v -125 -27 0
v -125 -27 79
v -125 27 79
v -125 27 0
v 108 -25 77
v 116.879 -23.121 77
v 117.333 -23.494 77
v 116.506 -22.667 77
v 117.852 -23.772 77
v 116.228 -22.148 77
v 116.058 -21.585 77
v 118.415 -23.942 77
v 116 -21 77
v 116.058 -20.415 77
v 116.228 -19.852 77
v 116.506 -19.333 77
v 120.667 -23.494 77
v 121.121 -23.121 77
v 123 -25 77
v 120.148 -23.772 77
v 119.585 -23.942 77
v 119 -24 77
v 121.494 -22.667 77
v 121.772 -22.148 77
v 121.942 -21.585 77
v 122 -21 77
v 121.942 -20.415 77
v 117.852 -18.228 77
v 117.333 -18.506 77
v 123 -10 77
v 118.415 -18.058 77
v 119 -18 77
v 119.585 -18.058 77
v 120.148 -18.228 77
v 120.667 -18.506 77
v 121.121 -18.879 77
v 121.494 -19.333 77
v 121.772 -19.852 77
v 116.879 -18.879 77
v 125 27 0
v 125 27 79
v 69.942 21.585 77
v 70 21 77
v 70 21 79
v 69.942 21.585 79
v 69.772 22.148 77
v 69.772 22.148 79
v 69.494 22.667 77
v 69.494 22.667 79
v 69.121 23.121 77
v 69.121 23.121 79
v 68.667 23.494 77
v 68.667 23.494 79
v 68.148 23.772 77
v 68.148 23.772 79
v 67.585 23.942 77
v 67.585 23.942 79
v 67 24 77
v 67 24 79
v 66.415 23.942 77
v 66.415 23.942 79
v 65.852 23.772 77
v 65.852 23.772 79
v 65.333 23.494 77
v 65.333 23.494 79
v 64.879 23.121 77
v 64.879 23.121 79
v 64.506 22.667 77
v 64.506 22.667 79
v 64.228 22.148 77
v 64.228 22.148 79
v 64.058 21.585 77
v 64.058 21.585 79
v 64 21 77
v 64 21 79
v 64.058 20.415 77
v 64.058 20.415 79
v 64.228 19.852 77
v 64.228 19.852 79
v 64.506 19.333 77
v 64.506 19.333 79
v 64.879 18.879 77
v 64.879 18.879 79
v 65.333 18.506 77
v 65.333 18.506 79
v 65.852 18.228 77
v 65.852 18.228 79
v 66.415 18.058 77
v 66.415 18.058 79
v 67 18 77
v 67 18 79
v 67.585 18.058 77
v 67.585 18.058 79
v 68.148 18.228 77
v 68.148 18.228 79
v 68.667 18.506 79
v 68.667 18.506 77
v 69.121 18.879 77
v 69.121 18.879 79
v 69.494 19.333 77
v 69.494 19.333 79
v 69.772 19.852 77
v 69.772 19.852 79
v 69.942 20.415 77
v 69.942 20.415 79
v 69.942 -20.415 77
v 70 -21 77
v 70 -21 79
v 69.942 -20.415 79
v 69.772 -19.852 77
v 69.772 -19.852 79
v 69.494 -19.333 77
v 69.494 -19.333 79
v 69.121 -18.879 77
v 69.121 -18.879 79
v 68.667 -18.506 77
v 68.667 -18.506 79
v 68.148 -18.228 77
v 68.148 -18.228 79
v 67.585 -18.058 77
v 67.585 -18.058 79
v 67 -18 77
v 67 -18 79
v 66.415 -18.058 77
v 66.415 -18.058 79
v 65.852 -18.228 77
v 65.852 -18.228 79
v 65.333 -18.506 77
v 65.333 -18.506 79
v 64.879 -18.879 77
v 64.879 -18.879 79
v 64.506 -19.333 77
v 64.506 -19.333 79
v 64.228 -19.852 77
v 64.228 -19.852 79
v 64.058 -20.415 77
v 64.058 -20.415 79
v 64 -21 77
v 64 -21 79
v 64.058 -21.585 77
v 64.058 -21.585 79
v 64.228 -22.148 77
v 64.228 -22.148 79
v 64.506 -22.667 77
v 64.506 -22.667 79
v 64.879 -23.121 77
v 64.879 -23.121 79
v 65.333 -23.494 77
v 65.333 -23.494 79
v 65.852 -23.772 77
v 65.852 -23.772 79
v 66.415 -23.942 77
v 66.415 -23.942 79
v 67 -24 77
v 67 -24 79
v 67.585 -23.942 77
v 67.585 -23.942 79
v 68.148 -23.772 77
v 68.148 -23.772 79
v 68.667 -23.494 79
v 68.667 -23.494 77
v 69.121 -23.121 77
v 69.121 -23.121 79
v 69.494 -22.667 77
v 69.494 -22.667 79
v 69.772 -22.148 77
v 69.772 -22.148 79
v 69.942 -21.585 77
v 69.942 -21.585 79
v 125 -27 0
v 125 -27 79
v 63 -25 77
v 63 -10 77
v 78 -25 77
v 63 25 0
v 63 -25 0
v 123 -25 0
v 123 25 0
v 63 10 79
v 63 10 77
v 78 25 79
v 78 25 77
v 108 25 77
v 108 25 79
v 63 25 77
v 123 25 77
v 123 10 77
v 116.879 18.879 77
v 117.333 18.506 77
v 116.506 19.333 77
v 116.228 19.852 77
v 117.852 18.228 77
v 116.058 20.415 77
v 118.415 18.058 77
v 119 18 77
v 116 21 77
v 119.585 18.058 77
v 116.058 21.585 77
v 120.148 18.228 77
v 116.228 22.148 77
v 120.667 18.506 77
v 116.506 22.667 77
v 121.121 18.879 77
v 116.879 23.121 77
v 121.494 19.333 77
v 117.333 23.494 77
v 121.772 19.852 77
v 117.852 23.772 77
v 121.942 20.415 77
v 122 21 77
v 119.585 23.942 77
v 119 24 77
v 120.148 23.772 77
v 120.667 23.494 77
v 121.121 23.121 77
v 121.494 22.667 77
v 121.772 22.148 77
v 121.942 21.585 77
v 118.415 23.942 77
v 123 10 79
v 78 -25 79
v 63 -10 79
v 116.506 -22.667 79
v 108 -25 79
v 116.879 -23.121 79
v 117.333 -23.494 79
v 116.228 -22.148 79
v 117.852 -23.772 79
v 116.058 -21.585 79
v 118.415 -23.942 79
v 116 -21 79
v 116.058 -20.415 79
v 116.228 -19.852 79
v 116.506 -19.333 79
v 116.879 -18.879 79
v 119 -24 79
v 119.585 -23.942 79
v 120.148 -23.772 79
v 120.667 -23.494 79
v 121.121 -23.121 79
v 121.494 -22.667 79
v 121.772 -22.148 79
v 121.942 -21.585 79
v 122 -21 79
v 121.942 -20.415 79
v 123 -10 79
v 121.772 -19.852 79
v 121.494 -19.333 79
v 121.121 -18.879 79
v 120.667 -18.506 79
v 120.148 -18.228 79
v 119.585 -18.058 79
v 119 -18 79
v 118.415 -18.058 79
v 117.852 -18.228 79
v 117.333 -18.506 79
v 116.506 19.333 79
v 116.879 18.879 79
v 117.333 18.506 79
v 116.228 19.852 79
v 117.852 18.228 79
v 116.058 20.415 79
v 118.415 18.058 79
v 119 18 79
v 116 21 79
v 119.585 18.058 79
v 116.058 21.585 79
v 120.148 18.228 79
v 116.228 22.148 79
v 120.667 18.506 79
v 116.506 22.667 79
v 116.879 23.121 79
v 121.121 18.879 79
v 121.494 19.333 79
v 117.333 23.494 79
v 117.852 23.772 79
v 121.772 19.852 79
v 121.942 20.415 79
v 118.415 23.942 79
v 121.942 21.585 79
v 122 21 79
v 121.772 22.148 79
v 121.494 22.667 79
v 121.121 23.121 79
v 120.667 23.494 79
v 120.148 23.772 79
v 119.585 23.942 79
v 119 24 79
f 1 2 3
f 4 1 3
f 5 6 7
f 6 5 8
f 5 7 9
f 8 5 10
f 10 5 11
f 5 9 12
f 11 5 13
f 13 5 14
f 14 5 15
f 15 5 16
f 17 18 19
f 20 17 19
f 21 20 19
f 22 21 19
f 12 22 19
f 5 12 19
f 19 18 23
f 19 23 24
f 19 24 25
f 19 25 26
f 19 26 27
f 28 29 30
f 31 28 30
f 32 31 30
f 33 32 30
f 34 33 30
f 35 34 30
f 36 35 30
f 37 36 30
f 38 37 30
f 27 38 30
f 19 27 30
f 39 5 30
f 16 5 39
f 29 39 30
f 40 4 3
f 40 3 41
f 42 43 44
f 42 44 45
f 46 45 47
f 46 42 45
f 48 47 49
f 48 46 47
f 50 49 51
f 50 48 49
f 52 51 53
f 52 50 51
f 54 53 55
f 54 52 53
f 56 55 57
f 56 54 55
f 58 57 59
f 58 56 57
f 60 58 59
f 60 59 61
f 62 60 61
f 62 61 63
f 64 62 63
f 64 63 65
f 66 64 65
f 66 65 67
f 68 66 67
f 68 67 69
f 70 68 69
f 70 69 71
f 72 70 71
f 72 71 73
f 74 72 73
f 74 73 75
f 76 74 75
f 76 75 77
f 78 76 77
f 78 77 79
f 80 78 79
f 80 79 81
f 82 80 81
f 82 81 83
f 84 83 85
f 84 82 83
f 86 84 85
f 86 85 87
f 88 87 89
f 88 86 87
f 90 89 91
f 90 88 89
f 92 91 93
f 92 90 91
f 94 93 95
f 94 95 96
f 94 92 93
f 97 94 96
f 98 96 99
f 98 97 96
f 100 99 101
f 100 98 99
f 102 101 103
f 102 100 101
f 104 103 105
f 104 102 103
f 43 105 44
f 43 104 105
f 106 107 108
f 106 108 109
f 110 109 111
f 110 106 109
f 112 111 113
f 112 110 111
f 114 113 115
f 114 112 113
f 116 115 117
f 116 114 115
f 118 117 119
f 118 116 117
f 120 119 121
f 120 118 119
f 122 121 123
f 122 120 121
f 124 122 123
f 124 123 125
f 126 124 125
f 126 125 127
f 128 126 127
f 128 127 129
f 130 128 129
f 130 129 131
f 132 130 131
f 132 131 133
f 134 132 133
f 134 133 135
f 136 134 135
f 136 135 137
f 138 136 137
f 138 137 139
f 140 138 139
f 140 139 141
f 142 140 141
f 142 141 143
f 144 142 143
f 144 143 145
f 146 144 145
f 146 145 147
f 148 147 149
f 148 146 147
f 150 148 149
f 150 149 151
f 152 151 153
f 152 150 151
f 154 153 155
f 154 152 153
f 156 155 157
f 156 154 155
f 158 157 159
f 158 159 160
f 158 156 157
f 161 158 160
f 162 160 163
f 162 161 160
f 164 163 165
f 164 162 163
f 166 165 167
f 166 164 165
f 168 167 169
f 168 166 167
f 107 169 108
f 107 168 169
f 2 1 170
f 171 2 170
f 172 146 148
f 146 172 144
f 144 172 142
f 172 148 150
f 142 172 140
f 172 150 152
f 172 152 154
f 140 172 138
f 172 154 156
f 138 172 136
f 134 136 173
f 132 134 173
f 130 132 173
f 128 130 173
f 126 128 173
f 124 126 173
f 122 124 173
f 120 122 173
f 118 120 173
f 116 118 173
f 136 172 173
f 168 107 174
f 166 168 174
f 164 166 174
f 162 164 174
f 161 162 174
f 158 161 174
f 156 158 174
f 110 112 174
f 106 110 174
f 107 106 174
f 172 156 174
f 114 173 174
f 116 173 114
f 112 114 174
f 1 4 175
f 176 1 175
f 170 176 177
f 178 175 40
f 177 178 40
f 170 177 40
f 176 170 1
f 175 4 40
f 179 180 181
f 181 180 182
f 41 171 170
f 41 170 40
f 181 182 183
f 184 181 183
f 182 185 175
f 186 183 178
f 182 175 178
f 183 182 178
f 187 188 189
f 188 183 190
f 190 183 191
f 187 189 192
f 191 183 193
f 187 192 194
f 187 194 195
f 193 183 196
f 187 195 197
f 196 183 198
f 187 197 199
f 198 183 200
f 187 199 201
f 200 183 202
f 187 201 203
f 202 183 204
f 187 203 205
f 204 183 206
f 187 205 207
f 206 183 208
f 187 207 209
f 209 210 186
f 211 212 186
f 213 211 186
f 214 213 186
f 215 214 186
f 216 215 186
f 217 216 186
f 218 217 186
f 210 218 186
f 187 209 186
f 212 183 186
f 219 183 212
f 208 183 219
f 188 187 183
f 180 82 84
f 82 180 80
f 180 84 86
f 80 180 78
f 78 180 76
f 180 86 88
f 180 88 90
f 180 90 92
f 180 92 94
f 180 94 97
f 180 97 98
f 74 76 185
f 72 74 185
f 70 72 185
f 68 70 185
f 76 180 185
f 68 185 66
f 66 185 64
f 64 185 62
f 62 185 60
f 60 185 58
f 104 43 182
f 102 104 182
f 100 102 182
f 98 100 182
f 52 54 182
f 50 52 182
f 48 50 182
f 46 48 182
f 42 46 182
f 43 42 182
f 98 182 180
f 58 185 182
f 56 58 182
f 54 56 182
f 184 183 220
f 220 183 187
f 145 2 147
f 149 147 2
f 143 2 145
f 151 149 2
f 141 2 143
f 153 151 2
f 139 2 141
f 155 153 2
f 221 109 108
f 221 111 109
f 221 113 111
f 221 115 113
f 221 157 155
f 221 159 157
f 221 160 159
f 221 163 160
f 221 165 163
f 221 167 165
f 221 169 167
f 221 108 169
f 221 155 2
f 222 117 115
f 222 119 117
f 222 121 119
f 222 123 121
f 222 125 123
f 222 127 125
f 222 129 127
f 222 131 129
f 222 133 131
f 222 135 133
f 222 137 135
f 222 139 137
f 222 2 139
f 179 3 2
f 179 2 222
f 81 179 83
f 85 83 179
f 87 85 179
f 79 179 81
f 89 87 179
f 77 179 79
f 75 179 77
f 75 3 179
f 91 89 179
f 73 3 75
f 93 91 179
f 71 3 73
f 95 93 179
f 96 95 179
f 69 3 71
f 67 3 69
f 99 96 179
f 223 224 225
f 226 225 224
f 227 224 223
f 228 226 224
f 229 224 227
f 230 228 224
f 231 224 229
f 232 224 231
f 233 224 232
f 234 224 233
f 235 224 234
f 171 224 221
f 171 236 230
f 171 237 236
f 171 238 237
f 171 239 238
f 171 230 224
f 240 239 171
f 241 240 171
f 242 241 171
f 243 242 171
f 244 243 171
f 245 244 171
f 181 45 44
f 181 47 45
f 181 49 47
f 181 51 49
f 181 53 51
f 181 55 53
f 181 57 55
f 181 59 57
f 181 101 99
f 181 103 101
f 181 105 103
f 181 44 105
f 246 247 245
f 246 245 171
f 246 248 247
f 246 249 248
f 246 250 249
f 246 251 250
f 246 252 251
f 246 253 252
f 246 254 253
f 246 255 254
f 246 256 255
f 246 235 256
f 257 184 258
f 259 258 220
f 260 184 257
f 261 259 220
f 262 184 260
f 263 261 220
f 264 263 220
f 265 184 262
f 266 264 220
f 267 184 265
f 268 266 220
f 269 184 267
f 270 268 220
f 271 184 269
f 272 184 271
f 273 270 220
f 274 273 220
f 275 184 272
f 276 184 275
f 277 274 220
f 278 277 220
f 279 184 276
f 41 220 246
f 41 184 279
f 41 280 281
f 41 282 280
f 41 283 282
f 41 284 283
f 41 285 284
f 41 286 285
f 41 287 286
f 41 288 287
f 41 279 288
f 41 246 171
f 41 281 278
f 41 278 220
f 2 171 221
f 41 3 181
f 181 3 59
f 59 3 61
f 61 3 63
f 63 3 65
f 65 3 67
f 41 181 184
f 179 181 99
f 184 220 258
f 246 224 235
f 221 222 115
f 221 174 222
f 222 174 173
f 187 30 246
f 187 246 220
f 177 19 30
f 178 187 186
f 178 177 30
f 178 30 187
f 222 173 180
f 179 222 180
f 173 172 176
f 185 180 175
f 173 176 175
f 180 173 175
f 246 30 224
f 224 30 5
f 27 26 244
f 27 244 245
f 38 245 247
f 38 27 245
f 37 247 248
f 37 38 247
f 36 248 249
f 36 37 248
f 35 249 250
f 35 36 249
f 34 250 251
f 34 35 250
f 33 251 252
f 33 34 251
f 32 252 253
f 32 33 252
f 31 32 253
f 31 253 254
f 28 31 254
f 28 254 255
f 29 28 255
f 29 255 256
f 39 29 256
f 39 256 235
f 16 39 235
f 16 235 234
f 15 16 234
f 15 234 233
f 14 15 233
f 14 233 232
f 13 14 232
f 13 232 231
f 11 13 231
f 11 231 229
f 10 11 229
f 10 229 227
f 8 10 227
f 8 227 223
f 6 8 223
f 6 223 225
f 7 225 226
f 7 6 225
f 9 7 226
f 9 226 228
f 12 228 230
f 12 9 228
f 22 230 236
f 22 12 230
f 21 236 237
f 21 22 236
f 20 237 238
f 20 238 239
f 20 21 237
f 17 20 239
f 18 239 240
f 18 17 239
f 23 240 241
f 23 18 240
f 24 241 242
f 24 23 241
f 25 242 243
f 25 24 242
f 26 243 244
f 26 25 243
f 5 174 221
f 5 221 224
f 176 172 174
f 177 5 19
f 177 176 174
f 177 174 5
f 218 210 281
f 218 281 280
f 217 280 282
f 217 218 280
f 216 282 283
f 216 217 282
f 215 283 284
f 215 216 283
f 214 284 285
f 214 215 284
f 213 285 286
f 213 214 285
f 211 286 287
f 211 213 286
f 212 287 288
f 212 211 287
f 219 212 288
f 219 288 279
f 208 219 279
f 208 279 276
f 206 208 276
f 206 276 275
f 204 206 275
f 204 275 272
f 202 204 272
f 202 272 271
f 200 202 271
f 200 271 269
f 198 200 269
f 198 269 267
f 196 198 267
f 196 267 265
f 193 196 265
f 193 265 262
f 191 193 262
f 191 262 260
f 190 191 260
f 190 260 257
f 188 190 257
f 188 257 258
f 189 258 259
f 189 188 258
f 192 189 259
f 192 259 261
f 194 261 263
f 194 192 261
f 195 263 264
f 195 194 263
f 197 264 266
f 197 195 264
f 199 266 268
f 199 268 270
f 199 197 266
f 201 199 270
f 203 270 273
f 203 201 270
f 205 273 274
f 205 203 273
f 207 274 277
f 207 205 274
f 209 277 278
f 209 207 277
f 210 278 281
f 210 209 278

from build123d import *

# Parameters (mm, degrees)
STRUCTURESKETCH002_W      = 250
STRUCTURESKETCH002_H      = 54
MAINSTRUCTURE002_DEPTH    = 79
ZONESKETCH002_R           = 3
CENTERPOCKET002_DEPTH     = 79
ZONEFILLSKETCH002_W       = 60
ZONEFILLSKETCH002_H       = 50
CENTERFILLPOCKET002_DEPTH = 77


with BuildPart() as part:
    # StructureSketch002 → MainStructure002 (new body)
    with BuildSketch(Plane.XY):
        Rectangle(STRUCTURESKETCH002_W, STRUCTURESKETCH002_H)
    extrude(amount=MAINSTRUCTURE002_DEPTH)

    # ZoneSketch002 (on DatumPlane) → CenterPocket002 (cut)
    with BuildSketch(Plane(origin=(93, 0, 0), x_dir=(1, 0, 0), z_dir=(0, 0, 1))):
        with Locations((-26, 21)):
            Circle(ZONESKETCH002_R)
        with Locations((26, 21)):
            Circle(ZONESKETCH002_R)
        with Locations((26, -21)):
            Circle(ZONESKETCH002_R)
        with Locations((-26, -21)):
            Circle(ZONESKETCH002_R)
        Polygon((-15, 25), (15, 25), (30, 10), (30, -10), (15, -25), (-15, -25), (-30, -10), (-30, 10), align=None)
    extrude(amount=CENTERPOCKET002_DEPTH, mode=Mode.SUBTRACT)

    # ZoneFillSketch002 (on DatumPlane) → CenterFillPocket002 (cut)
    with BuildSketch(Plane(origin=(93, 0, 0), x_dir=(1, 0, 0), z_dir=(0, 0, 1))):
        Rectangle(ZONEFILLSKETCH002_W, ZONEFILLSKETCH002_H)
    extrude(amount=CENTERFILLPOCKET002_DEPTH, mode=Mode.SUBTRACT)


solid = part.part
